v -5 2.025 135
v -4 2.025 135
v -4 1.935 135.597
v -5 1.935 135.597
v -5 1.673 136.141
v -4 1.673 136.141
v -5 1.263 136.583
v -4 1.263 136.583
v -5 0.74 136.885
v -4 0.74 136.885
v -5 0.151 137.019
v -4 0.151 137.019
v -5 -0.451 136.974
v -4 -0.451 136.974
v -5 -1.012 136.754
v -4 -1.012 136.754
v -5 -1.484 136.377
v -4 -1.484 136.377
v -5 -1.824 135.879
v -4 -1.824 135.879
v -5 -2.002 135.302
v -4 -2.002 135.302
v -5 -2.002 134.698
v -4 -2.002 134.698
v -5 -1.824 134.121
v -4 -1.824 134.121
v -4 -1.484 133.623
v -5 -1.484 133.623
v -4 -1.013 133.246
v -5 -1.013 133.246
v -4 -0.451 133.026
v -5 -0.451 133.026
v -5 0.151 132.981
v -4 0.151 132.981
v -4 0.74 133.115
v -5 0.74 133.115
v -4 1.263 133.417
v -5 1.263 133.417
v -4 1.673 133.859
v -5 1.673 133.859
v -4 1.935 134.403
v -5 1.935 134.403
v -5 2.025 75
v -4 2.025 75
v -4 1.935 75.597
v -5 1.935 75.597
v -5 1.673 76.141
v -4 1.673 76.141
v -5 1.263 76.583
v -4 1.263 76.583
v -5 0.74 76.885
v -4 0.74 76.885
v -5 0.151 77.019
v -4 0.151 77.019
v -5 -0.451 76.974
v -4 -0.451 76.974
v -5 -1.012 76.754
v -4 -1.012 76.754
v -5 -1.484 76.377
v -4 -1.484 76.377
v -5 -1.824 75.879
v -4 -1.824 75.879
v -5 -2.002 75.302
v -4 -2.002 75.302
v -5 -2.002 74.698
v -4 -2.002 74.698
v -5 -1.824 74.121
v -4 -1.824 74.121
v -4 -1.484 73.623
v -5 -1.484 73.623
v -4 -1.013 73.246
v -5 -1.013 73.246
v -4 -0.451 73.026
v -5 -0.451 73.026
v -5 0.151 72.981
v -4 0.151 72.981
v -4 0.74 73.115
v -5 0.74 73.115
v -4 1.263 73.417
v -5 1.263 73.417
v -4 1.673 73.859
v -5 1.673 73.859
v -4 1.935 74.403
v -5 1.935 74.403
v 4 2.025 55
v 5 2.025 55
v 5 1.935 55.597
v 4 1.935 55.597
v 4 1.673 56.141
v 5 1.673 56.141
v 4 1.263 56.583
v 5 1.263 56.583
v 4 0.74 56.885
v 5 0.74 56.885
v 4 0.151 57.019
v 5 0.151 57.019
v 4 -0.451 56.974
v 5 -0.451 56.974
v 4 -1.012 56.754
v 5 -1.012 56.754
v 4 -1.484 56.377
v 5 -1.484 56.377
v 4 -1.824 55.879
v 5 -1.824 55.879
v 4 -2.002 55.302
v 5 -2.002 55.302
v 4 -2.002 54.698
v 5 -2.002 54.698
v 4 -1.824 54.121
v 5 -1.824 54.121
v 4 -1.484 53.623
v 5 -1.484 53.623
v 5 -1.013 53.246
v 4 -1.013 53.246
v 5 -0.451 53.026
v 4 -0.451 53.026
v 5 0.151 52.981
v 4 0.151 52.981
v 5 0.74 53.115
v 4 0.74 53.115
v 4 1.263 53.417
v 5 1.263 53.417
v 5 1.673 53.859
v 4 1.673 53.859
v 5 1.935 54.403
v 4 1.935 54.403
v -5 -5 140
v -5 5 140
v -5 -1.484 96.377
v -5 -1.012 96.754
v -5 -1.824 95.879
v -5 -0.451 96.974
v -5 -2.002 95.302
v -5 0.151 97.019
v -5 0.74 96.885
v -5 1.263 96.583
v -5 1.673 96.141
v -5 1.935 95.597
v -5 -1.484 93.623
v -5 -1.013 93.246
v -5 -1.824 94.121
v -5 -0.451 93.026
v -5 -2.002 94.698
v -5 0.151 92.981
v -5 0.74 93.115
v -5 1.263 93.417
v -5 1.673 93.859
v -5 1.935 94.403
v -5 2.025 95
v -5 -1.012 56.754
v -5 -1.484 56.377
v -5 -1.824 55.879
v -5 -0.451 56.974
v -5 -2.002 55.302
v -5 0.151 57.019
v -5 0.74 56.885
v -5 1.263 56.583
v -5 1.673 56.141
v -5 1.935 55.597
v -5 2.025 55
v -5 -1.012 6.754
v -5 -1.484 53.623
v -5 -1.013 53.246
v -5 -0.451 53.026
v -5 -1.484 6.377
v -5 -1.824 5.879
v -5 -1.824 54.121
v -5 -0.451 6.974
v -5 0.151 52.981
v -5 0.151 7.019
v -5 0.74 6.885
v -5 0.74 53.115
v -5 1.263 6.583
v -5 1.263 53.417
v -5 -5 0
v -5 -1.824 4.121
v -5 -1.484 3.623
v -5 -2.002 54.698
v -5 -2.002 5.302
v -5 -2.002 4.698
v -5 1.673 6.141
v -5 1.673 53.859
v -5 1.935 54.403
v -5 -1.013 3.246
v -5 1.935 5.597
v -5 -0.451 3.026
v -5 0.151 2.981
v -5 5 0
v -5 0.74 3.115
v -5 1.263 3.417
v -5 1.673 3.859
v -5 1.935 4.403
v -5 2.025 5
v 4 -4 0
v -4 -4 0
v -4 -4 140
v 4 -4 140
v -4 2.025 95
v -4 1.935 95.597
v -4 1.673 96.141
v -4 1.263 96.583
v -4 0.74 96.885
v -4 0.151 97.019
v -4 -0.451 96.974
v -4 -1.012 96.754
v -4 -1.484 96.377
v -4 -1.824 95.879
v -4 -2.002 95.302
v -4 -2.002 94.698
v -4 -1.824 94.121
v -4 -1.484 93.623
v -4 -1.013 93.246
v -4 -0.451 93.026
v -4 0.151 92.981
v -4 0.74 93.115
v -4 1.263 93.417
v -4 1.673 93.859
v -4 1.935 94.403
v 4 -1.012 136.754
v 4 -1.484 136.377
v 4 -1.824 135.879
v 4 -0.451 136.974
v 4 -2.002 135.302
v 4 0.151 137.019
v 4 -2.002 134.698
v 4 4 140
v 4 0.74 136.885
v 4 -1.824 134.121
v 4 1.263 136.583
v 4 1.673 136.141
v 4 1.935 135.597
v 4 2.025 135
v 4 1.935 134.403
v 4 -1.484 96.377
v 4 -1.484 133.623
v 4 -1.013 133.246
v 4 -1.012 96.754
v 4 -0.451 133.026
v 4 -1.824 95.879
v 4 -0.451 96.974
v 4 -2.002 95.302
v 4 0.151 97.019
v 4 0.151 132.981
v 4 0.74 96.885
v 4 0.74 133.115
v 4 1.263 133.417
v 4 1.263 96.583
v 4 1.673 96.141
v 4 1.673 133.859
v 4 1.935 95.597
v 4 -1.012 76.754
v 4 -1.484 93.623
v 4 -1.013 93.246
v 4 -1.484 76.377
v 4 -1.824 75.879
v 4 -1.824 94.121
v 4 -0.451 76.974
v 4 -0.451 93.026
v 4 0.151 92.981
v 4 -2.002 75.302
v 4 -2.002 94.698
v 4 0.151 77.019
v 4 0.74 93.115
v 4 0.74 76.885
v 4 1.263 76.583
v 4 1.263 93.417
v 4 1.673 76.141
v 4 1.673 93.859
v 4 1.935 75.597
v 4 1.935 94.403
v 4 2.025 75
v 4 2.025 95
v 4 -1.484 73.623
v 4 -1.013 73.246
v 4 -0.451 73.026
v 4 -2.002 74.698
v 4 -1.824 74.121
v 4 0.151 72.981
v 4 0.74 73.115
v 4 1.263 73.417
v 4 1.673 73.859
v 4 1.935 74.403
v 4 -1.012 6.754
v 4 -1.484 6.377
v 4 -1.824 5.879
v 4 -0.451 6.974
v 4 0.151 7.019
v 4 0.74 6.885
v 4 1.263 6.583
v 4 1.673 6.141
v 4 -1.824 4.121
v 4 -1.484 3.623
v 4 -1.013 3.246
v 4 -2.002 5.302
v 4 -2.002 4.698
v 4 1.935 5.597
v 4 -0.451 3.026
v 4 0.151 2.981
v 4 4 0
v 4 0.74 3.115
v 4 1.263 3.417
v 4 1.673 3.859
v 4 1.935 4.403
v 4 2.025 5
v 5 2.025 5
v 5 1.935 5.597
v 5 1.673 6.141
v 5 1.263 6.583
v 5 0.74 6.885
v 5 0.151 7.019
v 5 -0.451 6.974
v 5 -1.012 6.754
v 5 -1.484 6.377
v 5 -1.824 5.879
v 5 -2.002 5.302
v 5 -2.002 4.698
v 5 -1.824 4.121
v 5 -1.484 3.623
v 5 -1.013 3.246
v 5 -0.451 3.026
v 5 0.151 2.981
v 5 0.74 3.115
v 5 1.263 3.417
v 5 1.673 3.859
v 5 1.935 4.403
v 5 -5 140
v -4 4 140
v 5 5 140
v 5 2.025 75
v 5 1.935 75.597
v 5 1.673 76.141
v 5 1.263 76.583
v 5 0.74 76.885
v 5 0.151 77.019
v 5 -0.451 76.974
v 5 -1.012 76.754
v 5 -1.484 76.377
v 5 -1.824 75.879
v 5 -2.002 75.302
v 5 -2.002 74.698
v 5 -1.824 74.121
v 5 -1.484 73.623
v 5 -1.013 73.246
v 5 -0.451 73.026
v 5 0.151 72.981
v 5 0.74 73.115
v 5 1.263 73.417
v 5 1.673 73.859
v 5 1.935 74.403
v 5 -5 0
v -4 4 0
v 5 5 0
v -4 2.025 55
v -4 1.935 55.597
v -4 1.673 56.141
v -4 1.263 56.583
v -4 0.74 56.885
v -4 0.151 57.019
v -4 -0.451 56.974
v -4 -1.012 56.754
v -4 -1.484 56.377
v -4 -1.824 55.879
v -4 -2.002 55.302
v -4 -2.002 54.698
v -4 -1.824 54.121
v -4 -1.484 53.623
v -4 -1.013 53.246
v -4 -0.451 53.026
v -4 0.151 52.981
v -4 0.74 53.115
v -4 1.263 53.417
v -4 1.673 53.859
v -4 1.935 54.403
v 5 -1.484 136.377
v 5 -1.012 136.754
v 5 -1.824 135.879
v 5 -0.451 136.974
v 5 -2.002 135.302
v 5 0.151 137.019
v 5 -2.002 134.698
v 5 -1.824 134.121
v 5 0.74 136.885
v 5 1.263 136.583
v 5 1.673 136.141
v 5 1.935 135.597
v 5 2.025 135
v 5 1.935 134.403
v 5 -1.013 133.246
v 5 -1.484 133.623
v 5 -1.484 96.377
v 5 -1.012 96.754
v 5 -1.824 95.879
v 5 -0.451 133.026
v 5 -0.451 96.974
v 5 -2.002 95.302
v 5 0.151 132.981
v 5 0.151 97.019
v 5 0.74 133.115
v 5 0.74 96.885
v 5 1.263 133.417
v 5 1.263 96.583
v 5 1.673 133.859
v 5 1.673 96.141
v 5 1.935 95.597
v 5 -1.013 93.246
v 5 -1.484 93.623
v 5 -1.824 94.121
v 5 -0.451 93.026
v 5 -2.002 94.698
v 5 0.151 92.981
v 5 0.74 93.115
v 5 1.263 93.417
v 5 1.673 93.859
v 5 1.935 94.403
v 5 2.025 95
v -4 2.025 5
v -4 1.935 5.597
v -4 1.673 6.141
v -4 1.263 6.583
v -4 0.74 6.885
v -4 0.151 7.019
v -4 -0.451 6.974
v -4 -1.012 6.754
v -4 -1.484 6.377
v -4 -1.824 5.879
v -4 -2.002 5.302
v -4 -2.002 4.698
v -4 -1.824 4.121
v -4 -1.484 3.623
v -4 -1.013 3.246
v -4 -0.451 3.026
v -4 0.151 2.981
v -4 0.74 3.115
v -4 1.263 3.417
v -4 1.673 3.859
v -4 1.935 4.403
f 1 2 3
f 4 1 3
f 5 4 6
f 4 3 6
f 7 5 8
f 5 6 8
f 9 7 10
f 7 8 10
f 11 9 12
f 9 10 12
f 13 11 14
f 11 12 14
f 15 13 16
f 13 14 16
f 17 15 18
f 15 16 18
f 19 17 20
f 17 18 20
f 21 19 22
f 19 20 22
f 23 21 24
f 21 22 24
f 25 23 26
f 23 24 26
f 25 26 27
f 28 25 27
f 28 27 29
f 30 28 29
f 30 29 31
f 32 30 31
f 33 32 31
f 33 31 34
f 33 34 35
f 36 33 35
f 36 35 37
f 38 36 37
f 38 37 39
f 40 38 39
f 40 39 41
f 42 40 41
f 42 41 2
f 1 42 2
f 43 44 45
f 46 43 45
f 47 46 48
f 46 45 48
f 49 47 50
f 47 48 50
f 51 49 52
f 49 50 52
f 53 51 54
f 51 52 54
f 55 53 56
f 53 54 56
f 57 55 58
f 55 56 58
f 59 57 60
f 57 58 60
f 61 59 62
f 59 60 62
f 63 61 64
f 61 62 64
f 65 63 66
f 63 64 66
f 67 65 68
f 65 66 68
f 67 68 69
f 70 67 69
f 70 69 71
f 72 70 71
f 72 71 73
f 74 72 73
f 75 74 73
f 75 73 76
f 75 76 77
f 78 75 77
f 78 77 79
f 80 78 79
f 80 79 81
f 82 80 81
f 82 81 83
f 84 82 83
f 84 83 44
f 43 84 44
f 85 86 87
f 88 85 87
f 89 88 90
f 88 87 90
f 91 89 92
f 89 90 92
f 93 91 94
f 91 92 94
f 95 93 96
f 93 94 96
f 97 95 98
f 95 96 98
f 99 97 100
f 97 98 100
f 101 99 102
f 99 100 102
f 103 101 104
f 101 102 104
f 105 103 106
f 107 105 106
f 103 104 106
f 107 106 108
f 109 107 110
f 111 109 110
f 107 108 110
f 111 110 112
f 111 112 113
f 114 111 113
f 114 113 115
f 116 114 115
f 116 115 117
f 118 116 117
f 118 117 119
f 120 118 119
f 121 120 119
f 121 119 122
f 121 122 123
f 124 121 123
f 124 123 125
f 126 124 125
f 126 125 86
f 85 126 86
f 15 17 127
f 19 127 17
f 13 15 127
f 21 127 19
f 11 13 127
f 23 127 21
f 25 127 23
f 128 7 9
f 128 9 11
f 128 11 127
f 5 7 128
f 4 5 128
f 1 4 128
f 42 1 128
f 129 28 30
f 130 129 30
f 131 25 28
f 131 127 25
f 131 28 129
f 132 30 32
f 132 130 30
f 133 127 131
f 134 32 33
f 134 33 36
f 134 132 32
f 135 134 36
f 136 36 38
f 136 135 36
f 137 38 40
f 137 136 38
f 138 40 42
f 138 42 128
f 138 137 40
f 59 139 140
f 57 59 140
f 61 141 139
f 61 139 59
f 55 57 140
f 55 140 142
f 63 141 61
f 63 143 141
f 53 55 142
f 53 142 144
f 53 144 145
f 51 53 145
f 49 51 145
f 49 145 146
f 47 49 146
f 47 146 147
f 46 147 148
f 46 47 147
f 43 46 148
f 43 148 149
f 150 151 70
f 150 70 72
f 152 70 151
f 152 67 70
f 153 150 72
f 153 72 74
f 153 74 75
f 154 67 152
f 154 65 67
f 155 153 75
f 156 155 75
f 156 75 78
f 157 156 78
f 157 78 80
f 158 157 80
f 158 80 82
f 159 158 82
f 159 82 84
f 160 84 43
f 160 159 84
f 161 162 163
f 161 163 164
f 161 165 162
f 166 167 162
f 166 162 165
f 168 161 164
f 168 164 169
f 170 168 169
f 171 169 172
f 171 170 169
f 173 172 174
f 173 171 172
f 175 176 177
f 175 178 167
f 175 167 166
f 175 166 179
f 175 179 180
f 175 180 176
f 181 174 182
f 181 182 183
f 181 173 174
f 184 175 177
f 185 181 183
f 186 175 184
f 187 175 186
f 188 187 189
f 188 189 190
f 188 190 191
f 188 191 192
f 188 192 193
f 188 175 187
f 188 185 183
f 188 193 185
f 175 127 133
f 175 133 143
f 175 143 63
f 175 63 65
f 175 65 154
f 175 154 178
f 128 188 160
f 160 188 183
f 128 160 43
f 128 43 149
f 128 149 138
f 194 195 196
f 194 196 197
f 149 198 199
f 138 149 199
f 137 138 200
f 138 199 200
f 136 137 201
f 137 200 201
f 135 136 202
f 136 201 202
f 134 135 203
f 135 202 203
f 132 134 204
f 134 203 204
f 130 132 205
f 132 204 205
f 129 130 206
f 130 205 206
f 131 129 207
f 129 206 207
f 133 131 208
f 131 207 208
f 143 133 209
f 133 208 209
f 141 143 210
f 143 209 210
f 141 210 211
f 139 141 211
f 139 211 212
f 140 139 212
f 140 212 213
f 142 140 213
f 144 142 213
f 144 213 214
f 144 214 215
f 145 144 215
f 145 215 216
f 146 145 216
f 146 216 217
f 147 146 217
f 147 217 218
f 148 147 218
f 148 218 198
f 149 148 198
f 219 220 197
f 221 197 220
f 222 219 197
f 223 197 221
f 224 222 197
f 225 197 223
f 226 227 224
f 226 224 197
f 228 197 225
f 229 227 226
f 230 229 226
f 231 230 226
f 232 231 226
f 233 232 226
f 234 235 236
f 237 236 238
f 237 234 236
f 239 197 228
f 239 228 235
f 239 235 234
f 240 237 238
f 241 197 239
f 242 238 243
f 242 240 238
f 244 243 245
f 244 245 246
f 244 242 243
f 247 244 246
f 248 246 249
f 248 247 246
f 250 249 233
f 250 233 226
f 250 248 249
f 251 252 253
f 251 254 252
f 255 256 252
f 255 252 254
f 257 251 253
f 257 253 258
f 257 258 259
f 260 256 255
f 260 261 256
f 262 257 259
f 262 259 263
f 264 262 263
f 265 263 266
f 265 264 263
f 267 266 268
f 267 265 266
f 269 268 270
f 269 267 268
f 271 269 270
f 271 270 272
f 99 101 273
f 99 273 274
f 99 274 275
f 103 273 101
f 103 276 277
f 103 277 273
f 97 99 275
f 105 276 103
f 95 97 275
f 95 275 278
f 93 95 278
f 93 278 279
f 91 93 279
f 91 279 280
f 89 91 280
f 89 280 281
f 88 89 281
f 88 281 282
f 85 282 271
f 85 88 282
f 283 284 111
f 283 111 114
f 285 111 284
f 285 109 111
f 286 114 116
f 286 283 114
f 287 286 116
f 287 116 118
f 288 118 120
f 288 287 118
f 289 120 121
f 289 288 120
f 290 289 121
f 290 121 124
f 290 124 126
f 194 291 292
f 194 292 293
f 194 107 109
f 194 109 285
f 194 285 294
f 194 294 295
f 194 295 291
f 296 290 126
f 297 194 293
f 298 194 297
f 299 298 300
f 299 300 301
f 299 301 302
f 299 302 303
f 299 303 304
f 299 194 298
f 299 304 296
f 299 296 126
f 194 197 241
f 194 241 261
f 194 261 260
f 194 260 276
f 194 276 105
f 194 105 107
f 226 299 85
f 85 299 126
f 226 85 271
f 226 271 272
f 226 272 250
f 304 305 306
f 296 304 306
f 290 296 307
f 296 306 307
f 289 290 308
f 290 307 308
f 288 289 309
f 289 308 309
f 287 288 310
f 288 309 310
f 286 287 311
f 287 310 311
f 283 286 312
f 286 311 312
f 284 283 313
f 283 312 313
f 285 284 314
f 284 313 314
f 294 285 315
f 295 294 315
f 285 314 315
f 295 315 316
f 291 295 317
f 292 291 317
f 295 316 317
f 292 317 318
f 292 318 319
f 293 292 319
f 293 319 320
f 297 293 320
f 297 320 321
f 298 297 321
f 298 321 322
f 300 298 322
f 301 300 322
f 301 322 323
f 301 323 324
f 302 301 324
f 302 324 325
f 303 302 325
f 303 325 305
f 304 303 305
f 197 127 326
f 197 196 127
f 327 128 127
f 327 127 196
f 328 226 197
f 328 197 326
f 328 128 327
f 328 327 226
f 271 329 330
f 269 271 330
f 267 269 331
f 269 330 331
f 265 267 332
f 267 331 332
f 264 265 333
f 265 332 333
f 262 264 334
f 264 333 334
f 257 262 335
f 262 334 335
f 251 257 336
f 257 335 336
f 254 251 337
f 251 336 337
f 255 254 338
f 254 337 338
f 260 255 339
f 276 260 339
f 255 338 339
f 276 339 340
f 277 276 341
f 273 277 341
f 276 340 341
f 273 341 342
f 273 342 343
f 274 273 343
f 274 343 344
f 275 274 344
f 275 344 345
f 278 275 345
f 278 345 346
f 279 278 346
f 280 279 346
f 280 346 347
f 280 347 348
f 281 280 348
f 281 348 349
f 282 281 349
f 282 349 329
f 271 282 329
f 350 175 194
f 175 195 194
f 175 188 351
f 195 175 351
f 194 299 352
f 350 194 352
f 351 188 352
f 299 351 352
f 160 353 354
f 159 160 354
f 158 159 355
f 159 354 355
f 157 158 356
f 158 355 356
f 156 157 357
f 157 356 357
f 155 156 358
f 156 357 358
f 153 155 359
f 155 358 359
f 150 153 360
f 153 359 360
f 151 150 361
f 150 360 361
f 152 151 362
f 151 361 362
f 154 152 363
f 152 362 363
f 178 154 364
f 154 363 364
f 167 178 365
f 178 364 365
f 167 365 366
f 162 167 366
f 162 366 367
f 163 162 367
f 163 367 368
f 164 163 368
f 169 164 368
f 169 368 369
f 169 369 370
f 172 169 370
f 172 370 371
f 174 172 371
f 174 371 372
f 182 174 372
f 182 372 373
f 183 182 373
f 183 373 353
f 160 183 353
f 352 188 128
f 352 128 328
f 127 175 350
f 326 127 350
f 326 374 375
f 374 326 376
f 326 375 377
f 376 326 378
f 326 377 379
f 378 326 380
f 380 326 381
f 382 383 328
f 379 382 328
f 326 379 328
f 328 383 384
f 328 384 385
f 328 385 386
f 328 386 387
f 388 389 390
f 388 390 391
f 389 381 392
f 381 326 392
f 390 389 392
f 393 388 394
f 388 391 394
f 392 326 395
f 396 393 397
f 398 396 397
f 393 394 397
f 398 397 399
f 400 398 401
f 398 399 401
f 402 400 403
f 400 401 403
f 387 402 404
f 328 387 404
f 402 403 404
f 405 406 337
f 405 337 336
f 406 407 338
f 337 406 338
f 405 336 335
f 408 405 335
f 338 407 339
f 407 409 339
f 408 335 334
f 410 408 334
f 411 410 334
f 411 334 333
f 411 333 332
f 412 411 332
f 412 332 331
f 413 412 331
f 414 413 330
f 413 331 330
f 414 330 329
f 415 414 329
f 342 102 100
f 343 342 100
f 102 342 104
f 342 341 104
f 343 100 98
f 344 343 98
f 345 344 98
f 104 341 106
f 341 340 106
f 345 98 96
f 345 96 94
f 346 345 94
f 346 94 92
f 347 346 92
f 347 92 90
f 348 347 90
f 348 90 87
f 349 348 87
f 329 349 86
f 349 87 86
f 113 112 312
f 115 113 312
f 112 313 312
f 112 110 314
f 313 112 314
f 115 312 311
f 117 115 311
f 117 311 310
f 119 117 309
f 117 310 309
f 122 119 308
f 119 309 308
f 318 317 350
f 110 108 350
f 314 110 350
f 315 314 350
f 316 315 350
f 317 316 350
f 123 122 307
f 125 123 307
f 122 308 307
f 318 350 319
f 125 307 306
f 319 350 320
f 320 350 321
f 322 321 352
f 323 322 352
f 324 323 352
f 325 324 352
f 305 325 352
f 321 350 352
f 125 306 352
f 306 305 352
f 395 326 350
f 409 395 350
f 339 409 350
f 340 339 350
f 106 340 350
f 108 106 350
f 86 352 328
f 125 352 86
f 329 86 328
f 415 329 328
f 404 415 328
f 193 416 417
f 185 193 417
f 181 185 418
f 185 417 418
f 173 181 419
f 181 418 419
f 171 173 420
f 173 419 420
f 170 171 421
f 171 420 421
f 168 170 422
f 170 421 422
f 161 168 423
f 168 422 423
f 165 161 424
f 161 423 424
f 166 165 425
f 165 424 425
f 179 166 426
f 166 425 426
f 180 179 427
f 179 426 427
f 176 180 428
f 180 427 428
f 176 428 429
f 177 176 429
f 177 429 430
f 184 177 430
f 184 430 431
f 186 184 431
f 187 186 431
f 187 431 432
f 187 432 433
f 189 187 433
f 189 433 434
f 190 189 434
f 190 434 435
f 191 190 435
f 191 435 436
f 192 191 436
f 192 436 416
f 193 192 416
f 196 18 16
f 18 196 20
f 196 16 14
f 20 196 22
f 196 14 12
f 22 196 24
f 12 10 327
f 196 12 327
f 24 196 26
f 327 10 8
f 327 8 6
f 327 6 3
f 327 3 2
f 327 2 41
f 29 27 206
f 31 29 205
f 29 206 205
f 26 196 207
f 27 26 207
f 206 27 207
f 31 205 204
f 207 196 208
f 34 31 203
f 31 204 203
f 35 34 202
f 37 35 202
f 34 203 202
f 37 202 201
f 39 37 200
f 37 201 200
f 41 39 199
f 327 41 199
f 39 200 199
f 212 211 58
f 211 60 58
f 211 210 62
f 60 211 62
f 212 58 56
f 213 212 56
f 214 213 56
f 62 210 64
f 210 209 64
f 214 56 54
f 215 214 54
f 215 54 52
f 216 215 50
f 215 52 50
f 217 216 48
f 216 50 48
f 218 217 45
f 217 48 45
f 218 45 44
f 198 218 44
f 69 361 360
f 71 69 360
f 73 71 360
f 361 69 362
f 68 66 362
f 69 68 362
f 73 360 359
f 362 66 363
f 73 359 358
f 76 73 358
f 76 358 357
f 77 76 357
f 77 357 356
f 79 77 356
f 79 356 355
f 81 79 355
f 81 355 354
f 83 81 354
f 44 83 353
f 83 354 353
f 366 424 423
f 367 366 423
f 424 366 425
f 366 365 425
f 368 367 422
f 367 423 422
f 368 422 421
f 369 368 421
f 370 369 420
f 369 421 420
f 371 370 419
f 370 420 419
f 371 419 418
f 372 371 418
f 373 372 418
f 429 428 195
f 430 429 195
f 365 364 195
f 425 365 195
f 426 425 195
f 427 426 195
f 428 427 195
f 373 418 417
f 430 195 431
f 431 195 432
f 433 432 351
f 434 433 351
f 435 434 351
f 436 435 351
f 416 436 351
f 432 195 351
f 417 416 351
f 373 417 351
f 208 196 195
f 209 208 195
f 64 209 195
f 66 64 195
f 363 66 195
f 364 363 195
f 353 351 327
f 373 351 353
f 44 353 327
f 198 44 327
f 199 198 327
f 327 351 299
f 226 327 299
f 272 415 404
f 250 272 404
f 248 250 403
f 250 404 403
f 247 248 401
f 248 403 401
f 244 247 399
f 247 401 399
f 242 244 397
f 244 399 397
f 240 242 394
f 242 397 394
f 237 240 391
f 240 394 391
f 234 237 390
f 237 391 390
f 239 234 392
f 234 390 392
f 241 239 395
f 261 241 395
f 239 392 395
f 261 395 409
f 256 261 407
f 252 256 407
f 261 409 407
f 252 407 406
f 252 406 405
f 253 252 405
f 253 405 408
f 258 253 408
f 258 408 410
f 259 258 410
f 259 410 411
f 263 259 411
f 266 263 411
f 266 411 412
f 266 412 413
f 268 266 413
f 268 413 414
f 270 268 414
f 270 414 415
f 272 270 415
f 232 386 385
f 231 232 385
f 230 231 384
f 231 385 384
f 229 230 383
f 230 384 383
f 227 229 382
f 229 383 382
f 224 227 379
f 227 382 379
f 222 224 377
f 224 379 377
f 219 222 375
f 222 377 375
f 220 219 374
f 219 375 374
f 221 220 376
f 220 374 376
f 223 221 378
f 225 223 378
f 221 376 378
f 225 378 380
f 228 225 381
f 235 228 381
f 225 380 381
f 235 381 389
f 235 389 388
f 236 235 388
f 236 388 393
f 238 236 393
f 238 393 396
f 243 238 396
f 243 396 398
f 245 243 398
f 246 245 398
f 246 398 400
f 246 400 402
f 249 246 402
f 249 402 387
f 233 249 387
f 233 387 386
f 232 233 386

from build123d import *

# Parameters (mm, degrees)
SKETCH1_W           = 10
SKETCH1_H           = 10
SKETCH1_W_2         = 8
SKETCH1_H_2         = 8
BOSS_EXTRUDE1_DEPTH = 140
SKETCH2_R           = 2.025
CUT_EXTRUDE1_DEPTH  = 141.445719052
SKETCH3_R           = 2.025
CUT_EXTRUDE2_DEPTH  = 141.445719052
SKETCH4_R           = 2.025
CUT_EXTRUDE3_DEPTH  = 141.445719052


with BuildPart() as part:
    # Sketch1 → Boss-Extrude1 (new body)
    with BuildSketch(Plane.XY):
        Rectangle(SKETCH1_W, SKETCH1_H)
        Rectangle(SKETCH1_W_2, SKETCH1_H_2, mode=Mode.SUBTRACT)
    extrude(amount=BOSS_EXTRUDE1_DEPTH)

    # Sketch2 → Cut-Extrude1 (cut, through all)
    with BuildSketch(Plane(origin=(5, 0, 0), x_dir=(0, 0, -1), z_dir=(1, 0, 0))):
        with Locations(Location((-5, 0, 0), (0, 0, 90))):
            Circle(SKETCH2_R)
    extrude(amount=-CUT_EXTRUDE1_DEPTH, mode=Mode.SUBTRACT)

    # Sketch3 → Cut-Extrude2 (cut, through all)
    with BuildSketch(Plane(origin=(5, 0, 0), x_dir=(0, 0, -1), z_dir=(1, 0, 0))):
        with Locations(Location((-75, 0, 0), (0, 0, 90))):
            Circle(SKETCH3_R)
        with Locations(Location((-55, 0, 0), (0, 0, 90))):
            Circle(SKETCH3_R)
    extrude(amount=-CUT_EXTRUDE2_DEPTH, mode=Mode.SUBTRACT)

    # Sketch4 → Cut-Extrude3 (cut, through all)
    with BuildSketch(Plane(origin=(5, 0, 0), x_dir=(0, 0, -1), z_dir=(1, 0, 0))):
        with Locations(Location((-135, 0, 0), (0, 0, 90))):
            Circle(SKETCH4_R)
        with Locations(Location((-95, 0, 0), (0, 0, 90))):
            Circle(SKETCH4_R)
    extrude(amount=-CUT_EXTRUDE3_DEPTH, mode=Mode.SUBTRACT)


solid = part.part
